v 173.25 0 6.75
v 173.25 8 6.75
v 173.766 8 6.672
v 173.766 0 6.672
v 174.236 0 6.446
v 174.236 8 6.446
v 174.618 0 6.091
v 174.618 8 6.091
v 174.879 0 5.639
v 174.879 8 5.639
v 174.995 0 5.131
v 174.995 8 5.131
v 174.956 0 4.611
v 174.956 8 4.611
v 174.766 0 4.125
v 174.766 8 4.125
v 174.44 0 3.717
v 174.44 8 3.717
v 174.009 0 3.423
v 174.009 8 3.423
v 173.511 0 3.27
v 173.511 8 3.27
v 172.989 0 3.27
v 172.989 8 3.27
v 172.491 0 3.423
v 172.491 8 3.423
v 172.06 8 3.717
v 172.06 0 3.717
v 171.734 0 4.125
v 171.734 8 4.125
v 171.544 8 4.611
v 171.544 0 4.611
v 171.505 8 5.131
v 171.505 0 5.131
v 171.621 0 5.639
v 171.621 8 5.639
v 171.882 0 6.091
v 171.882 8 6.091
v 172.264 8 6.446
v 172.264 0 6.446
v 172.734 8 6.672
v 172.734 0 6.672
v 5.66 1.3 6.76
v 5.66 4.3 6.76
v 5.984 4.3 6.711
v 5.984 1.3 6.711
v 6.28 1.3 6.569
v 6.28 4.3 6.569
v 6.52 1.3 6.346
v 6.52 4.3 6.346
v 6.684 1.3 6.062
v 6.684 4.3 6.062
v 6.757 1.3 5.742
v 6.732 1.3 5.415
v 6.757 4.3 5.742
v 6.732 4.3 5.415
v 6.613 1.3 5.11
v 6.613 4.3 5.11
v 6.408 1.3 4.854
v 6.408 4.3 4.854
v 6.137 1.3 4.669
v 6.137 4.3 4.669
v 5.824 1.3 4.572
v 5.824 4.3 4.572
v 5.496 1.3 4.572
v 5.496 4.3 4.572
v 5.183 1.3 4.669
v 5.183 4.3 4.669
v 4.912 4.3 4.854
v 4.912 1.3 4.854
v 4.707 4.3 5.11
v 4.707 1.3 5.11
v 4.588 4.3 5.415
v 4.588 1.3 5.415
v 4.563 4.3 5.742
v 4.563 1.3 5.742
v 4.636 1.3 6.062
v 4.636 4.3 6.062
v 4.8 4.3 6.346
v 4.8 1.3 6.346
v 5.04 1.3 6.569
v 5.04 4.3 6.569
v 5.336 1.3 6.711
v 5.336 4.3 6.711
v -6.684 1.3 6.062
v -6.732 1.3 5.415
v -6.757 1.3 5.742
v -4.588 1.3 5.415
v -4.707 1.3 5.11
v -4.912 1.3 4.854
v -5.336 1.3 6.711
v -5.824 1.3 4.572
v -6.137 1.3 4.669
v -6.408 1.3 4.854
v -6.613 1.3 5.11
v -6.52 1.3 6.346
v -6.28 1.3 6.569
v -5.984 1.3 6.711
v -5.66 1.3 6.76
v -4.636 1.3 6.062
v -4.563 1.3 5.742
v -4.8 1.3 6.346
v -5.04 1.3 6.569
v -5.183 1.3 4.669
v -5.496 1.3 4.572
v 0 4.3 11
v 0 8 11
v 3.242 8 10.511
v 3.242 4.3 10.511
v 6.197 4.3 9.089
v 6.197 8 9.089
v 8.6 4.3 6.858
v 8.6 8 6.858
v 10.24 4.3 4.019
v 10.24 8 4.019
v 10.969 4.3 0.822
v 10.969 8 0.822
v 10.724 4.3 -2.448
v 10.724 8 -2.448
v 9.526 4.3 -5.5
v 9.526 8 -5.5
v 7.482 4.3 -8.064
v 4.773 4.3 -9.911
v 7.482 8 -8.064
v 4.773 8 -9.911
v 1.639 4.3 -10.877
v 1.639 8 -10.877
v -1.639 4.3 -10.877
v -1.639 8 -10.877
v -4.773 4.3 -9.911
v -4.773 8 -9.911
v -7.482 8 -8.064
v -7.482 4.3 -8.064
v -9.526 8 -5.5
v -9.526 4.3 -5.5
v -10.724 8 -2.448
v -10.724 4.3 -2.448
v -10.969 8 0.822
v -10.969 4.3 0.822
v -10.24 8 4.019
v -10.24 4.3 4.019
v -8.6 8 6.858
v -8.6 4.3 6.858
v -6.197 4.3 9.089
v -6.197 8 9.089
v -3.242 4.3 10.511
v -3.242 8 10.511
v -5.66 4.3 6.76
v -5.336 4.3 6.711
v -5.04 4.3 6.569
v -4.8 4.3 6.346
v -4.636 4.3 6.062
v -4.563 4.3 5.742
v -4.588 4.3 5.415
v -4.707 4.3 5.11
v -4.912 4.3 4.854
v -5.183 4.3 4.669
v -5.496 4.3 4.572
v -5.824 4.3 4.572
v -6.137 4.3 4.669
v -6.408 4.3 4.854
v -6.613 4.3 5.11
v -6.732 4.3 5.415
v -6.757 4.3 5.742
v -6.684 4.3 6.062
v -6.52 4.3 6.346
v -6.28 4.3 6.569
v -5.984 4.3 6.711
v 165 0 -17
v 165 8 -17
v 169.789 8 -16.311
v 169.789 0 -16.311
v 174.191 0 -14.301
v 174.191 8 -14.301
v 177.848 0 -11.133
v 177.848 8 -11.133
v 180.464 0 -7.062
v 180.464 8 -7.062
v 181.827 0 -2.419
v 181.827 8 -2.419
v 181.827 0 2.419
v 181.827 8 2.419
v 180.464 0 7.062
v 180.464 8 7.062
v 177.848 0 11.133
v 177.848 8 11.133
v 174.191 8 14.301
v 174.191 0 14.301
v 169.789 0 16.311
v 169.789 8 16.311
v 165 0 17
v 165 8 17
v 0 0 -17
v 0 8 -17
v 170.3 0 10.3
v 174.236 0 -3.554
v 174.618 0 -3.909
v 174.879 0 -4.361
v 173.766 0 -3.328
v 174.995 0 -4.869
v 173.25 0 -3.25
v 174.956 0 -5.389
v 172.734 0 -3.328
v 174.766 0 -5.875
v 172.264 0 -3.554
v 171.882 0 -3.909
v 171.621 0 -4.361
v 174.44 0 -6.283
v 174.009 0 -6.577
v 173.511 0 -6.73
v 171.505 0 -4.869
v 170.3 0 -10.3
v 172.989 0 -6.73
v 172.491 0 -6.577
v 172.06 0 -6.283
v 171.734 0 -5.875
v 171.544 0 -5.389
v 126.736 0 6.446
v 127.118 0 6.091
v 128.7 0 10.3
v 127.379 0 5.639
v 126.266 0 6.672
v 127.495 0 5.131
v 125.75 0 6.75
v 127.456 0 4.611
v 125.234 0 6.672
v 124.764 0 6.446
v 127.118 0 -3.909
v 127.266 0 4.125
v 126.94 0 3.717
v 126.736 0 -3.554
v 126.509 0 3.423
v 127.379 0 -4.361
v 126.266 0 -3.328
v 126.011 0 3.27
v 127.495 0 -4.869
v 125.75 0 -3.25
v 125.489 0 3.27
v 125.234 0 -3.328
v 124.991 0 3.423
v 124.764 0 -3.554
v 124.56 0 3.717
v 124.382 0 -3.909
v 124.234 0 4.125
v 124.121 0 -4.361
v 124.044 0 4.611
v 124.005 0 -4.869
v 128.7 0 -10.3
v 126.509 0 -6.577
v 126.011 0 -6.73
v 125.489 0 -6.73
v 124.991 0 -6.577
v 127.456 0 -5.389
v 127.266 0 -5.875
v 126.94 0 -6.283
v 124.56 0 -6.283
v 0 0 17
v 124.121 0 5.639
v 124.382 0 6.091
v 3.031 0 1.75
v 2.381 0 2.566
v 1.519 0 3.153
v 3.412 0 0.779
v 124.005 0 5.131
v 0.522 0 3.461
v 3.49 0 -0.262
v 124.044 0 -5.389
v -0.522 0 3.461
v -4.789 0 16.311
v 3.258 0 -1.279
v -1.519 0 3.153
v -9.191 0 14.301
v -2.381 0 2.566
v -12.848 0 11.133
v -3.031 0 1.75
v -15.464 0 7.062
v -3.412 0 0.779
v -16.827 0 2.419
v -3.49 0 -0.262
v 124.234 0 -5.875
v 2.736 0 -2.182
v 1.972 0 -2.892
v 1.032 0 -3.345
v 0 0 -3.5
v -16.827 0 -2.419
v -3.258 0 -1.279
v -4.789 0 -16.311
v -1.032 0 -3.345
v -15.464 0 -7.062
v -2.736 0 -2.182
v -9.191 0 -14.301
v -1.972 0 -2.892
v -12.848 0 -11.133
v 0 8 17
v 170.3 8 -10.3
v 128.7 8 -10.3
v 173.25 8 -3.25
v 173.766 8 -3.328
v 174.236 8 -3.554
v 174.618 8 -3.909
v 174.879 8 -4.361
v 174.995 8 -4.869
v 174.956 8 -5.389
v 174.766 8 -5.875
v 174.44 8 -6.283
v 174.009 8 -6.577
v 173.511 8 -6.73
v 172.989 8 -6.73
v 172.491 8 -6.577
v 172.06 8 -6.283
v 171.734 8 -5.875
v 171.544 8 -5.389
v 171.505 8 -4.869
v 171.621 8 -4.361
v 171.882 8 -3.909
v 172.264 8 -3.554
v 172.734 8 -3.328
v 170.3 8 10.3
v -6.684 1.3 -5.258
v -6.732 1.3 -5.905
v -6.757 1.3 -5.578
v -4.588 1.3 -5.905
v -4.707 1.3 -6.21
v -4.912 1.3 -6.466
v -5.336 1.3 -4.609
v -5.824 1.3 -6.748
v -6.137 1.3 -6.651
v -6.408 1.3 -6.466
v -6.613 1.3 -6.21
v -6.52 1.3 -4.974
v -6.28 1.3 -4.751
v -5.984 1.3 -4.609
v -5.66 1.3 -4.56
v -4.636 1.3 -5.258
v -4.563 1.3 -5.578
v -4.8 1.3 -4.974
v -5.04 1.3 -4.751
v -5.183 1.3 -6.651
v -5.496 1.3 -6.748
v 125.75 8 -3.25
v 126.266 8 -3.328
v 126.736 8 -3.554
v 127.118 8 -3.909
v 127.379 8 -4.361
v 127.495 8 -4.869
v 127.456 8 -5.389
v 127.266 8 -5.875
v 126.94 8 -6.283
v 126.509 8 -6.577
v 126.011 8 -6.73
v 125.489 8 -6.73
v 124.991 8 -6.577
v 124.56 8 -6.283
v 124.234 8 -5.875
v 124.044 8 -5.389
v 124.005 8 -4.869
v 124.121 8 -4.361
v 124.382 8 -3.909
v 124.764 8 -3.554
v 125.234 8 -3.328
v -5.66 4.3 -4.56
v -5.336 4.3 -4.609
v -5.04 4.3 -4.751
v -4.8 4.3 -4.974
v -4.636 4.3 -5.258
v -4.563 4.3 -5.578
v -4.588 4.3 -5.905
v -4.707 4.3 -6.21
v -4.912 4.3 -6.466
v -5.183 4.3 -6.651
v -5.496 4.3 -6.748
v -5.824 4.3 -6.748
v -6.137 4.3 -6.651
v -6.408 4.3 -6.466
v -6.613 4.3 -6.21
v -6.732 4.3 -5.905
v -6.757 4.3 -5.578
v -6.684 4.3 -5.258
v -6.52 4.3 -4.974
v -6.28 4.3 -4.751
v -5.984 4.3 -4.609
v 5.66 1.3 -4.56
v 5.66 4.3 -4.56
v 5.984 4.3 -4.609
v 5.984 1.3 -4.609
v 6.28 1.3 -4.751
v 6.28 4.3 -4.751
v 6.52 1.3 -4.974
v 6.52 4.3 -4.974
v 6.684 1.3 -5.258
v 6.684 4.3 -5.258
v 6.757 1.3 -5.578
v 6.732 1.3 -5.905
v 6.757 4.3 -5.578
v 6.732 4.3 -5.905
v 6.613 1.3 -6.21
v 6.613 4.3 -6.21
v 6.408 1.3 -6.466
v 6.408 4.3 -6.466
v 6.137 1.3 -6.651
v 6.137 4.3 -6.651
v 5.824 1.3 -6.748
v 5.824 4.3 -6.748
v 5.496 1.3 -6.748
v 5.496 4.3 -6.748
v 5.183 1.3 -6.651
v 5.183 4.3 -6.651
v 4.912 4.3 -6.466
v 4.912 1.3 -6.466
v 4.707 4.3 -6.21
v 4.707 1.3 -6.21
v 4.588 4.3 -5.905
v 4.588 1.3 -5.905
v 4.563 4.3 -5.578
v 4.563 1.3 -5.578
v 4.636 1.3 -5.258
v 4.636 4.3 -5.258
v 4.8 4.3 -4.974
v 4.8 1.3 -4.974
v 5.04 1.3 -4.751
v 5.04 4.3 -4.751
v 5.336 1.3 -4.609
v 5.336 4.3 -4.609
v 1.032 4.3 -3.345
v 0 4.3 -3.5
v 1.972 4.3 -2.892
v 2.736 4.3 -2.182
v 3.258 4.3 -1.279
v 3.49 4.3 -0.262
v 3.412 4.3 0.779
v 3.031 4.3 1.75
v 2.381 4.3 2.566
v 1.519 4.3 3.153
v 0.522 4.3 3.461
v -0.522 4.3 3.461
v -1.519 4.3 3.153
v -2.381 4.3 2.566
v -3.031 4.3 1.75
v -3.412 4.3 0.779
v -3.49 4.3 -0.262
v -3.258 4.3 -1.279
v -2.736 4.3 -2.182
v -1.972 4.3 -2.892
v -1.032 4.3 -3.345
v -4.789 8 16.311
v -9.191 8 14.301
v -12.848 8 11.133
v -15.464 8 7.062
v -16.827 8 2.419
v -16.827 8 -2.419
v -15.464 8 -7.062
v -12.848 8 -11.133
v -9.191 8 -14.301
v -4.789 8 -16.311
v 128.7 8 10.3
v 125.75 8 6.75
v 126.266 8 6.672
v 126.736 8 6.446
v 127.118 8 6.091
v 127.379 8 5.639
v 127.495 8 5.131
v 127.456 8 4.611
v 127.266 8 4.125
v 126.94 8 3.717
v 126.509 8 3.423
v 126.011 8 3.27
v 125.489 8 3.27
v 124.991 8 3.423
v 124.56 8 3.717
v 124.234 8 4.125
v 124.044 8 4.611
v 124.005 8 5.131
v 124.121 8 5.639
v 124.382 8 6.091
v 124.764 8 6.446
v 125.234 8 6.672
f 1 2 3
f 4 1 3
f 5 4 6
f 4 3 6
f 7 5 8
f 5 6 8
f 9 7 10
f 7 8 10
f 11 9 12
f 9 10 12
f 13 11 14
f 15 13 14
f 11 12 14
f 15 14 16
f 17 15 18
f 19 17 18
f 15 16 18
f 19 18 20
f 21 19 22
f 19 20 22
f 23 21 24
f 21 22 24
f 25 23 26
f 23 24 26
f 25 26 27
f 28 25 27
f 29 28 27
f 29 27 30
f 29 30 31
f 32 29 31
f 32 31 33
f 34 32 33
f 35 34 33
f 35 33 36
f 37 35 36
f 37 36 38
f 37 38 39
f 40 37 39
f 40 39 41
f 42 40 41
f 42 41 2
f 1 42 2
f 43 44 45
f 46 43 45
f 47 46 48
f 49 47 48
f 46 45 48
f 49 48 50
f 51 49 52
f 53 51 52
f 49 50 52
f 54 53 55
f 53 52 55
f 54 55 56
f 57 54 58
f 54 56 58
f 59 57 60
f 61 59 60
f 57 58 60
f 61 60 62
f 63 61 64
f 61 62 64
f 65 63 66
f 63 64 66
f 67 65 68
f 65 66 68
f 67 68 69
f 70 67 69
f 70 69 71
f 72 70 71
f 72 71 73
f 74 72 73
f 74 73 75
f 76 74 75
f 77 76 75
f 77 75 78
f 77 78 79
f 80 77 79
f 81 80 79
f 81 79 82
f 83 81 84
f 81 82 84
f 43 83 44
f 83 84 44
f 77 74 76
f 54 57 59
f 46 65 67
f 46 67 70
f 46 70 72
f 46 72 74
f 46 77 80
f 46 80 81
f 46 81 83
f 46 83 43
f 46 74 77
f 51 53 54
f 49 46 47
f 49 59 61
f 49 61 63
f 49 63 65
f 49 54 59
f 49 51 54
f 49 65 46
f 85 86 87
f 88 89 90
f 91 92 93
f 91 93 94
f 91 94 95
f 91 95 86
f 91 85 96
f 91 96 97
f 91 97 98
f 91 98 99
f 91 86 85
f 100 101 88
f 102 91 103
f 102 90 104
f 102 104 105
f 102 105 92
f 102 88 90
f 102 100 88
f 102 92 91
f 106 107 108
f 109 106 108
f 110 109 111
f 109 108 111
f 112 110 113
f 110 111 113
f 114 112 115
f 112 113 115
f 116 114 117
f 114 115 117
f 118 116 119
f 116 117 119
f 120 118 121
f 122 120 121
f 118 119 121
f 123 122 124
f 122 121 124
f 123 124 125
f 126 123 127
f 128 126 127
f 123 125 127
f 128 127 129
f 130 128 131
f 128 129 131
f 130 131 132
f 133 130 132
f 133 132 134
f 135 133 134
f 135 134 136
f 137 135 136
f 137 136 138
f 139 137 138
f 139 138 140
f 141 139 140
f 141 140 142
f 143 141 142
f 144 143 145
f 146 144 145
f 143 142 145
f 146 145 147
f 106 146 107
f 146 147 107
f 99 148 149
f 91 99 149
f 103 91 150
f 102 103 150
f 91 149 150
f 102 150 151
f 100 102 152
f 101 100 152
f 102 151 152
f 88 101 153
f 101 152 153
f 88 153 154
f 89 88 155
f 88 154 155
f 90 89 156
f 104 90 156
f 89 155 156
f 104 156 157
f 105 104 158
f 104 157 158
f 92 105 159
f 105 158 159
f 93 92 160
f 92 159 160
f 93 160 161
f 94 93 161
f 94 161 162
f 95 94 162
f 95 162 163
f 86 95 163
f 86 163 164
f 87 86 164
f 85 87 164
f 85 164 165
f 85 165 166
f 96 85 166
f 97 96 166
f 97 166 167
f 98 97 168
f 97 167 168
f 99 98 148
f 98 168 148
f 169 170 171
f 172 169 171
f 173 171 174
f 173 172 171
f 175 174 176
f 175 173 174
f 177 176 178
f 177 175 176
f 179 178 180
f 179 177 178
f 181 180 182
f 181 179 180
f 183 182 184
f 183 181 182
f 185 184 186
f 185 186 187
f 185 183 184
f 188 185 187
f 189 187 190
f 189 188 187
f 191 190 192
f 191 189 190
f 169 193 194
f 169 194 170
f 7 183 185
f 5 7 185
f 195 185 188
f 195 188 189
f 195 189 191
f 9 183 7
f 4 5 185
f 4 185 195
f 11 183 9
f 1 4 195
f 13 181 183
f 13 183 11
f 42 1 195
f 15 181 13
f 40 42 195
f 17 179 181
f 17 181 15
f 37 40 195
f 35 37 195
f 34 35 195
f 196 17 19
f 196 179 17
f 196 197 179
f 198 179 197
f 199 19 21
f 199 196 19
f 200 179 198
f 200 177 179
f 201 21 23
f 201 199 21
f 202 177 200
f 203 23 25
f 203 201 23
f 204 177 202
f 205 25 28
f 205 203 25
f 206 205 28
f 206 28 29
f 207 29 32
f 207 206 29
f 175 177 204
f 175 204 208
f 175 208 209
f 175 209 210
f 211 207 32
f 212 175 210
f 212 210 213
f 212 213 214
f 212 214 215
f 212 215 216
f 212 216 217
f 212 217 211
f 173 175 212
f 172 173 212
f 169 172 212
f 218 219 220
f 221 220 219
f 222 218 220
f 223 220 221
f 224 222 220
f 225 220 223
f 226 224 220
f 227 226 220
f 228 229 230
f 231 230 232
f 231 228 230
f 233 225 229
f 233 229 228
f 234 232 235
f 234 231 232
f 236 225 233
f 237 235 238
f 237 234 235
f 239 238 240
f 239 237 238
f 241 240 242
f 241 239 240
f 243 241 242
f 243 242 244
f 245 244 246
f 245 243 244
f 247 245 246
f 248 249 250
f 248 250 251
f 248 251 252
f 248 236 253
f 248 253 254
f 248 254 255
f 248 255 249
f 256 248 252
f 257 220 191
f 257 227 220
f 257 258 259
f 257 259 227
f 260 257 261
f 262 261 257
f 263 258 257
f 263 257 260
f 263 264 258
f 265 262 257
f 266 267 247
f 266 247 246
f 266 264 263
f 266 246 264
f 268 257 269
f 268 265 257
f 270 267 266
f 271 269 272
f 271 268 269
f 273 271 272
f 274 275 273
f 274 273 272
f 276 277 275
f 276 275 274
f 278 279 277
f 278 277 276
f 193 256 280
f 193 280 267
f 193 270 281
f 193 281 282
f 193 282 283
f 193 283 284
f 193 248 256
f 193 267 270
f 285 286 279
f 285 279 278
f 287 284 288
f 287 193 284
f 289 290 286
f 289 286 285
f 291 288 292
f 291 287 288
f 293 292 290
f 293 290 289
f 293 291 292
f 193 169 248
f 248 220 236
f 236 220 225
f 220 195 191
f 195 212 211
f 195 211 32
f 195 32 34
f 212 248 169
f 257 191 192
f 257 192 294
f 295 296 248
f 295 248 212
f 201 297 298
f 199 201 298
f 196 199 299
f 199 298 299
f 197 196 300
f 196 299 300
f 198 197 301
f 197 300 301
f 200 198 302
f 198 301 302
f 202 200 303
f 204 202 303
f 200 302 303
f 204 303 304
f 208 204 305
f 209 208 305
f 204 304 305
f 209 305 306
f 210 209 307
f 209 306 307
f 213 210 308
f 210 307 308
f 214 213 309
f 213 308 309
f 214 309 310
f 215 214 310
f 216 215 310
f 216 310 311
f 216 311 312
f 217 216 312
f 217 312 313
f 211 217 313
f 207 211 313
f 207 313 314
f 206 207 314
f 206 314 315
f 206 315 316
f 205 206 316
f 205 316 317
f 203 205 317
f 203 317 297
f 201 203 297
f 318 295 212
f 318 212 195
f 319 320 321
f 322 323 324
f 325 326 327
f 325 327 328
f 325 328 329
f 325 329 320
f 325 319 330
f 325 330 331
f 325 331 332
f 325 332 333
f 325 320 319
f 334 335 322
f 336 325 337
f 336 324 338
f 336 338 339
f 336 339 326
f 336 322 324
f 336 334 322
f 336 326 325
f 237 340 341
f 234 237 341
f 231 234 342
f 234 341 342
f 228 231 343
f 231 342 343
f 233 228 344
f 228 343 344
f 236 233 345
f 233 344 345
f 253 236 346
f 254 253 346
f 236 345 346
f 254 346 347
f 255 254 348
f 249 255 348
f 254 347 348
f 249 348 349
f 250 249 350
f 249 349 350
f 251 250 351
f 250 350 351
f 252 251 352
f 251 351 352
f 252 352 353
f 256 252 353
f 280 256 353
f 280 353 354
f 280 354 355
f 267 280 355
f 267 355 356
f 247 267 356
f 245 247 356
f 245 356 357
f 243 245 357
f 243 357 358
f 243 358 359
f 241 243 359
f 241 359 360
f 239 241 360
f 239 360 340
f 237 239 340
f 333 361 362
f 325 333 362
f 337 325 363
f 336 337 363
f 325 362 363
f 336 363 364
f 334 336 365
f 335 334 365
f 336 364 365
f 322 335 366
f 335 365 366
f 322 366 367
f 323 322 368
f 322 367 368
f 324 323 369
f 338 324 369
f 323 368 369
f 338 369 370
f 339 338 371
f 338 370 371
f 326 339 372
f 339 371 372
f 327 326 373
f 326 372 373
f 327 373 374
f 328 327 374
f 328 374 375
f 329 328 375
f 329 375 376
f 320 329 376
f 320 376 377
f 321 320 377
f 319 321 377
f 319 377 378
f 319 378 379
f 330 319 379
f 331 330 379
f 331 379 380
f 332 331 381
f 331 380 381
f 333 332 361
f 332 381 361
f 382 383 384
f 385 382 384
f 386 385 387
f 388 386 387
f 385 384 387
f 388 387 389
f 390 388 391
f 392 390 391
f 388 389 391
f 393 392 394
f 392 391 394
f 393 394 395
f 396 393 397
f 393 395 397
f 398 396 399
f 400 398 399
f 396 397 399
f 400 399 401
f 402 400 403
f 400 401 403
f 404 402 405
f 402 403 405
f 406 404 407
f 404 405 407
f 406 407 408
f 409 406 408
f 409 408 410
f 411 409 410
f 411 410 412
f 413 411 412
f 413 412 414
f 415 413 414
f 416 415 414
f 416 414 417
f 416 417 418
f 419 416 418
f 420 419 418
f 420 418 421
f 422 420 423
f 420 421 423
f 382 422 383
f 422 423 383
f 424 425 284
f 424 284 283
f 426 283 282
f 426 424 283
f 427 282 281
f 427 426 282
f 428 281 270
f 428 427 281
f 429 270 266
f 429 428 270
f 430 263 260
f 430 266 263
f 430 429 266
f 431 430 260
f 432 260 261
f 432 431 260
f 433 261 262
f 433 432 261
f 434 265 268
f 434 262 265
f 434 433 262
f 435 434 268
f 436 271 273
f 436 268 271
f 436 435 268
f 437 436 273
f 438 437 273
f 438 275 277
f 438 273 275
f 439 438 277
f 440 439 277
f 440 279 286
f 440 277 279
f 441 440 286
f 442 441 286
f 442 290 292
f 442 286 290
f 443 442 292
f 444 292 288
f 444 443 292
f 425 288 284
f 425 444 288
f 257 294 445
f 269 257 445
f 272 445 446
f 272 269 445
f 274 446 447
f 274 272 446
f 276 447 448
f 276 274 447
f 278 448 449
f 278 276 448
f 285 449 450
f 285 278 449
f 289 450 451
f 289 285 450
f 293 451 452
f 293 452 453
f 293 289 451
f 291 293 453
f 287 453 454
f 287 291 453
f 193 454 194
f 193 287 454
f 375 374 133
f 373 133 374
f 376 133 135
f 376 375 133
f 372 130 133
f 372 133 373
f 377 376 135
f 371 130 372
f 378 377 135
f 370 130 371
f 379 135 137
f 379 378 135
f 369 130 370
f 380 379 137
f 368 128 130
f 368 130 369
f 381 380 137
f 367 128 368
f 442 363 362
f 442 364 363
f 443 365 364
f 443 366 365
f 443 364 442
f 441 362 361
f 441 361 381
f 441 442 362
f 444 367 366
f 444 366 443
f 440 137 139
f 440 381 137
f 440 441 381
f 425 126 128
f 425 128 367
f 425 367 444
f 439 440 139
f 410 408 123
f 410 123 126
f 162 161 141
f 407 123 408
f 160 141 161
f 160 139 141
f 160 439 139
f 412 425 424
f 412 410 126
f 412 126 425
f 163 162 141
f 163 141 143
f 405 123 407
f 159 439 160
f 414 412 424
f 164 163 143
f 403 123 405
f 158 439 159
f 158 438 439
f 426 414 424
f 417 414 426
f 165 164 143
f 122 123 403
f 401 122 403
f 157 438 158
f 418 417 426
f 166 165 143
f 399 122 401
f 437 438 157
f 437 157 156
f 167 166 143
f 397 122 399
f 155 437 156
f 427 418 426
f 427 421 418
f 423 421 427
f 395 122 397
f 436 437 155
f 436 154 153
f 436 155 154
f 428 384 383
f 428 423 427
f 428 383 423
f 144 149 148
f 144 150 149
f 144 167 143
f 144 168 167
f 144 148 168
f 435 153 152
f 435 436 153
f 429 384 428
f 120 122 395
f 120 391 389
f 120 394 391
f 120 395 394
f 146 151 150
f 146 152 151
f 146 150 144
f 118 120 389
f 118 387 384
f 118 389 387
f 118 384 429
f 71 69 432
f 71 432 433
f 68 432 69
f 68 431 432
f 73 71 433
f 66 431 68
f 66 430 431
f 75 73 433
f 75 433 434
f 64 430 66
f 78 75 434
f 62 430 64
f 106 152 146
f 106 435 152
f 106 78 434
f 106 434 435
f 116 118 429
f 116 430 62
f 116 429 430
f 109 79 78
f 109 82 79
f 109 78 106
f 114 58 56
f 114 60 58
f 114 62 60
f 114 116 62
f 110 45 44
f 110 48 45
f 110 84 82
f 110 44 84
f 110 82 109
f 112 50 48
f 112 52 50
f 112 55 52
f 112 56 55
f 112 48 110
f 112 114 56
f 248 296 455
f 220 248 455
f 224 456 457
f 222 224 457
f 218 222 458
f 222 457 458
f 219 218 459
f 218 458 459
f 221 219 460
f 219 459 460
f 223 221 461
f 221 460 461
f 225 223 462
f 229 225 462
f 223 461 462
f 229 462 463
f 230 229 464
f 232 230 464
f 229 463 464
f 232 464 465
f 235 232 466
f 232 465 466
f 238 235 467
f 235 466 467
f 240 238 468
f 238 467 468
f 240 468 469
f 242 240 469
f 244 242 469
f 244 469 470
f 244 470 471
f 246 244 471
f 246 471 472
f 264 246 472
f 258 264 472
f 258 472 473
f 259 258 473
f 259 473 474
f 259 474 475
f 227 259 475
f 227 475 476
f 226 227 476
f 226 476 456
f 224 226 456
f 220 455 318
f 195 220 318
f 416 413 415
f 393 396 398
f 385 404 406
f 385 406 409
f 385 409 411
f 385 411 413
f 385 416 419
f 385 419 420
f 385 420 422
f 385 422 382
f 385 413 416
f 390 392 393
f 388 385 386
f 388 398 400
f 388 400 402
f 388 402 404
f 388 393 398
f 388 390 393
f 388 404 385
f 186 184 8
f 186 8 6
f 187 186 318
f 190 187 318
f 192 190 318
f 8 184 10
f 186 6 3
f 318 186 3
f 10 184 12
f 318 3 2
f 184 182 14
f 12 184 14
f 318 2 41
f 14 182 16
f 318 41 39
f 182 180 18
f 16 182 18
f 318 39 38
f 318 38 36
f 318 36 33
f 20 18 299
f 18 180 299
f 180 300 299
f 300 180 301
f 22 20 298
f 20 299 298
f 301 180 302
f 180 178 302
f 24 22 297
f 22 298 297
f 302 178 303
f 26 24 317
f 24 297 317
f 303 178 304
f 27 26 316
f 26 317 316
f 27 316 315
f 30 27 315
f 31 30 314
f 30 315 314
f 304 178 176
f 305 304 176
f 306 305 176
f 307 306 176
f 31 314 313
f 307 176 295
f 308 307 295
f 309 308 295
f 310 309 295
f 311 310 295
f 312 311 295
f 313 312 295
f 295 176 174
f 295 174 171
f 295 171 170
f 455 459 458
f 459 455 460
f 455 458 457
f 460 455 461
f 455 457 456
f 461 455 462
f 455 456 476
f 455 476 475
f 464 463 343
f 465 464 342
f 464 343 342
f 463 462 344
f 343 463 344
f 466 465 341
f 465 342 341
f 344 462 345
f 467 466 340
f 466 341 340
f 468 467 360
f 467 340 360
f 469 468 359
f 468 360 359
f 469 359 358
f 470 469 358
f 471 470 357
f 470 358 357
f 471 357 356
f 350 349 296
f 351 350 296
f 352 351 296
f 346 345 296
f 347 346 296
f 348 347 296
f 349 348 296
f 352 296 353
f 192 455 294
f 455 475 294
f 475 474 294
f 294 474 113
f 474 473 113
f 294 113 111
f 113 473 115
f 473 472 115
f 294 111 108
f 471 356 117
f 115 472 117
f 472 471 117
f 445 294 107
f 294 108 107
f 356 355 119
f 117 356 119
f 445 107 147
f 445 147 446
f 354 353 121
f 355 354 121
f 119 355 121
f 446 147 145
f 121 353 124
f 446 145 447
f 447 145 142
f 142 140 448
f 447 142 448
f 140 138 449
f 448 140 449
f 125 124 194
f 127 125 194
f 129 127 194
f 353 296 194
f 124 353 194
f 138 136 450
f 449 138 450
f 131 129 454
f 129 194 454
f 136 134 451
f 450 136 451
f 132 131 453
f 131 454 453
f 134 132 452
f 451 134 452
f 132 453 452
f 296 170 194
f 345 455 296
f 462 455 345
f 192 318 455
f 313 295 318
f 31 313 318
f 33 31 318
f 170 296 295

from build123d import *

# Parameters (mm, degrees)
ESTRUSIONE_ESTRUSIONE1_DEPTH  = 8
TAGLIO_ESTRUSIONE1_DEPTH      = 183.967210177
TAGLIO_ESTRUSIONE1_DEPTH_BACK = 183.967210177
SCHIZZO2_R                    = 3.5
SCHIZZO2_W                    = 41.6
SCHIZZO2_H                    = 20.6
SCHIZZO3_R                    = 11
TAGLIO_ESTRUSIONE2_DEPTH      = 3.7
SCHIZZO4_R                    = 1.1
TAGLIO_ESTRUSIONE3_DEPTH      = 3
SCHIZZO5_R                    = 1.75
TAGLIO_ESTRUSIONE4_DEPTH      = 183.967210177


with BuildPart() as part:
    # Schizzo1 → Estrusione-Estrusione1 (new body)
    with BuildSketch(Plane(origin=(0, 0, 0), x_dir=(1, 0, 0), z_dir=(0, 1, 0))):
        with BuildLine():
            Line((0, 17), (165, 17))
            ThreePointArc((165, 17), (182, 0), (165, -17))
            Line((165, -17), (0, -17))
            ThreePointArc((0, -17), (-17, 0), (0, 17))
        make_face()
    extrude(amount=ESTRUSIONE_ESTRUSIONE1_DEPTH)

    # Schizzo2 → Taglio-Estrusione1 (cut, two sides: drawn at the far end of the back side and taken through both)
    with BuildSketch(Plane.XZ.offset(-TAGLIO_ESTRUSIONE1_DEPTH_BACK)):
        with Locations(Location((0, 0, 0), (0, 0, 270))):
            Circle(SCHIZZO2_R)
        with Locations((149.5, 0)):
            Rectangle(SCHIZZO2_W, SCHIZZO2_H)
    extrude(amount=TAGLIO_ESTRUSIONE1_DEPTH + TAGLIO_ESTRUSIONE1_DEPTH_BACK, mode=Mode.SUBTRACT)

    # Schizzo3 → Taglio-Estrusione2 (cut)
    with BuildSketch(Plane(origin=(0, 8, 0), x_dir=(1, 0, 0), z_dir=(0, 1, 0))):
        with Locations(Location((0, 0, 0), (0, 0, 270))):
            Circle(SCHIZZO3_R)
    extrude(amount=-TAGLIO_ESTRUSIONE2_DEPTH, mode=Mode.SUBTRACT)

    # Schizzo4 → Taglio-Estrusione3 (cut)
    with BuildSketch(Plane(origin=(0, 4.3, 0), x_dir=(1, 0, 0), z_dir=(0, 1, 0))):
        with Locations(Location((-5.66, 5.66, 0), (0, 0, 270))):
            Circle(SCHIZZO4_R)
        with Locations(Location((5.66, 5.66, 0), (0, 0, 270))):
            Circle(SCHIZZO4_R)
        with Locations(Location((5.66, -5.66, 0), (0, 0, 270))):
            Circle(SCHIZZO4_R)
        with Locations(Location((-5.66, -5.66, 0), (0, 0, 270))):
            Circle(SCHIZZO4_R)
    extrude(amount=-TAGLIO_ESTRUSIONE3_DEPTH, mode=Mode.SUBTRACT)

    # Schizzo5 → Taglio-Estrusione4 (cut, through all)
    with BuildSketch(Plane(origin=(0, 8, 0), x_dir=(1, 0, 0), z_dir=(0, 1, 0))):
        with Locations(Location((125.75, 5, 0), (0, 0, 270))):
            Circle(SCHIZZO5_R)
        with Locations(Location((125.75, -5, 0), (0, 0, 270))):
            Circle(SCHIZZO5_R)
        with Locations(Location((173.25, -5, 0), (0, 0, 270))):
            Circle(SCHIZZO5_R)
        with Locations(Location((173.25, 5, 0), (0, 0, 270))):
            Circle(SCHIZZO5_R)
    extrude(amount=-TAGLIO_ESTRUSIONE4_DEPTH, mode=Mode.SUBTRACT)


solid = part.part
